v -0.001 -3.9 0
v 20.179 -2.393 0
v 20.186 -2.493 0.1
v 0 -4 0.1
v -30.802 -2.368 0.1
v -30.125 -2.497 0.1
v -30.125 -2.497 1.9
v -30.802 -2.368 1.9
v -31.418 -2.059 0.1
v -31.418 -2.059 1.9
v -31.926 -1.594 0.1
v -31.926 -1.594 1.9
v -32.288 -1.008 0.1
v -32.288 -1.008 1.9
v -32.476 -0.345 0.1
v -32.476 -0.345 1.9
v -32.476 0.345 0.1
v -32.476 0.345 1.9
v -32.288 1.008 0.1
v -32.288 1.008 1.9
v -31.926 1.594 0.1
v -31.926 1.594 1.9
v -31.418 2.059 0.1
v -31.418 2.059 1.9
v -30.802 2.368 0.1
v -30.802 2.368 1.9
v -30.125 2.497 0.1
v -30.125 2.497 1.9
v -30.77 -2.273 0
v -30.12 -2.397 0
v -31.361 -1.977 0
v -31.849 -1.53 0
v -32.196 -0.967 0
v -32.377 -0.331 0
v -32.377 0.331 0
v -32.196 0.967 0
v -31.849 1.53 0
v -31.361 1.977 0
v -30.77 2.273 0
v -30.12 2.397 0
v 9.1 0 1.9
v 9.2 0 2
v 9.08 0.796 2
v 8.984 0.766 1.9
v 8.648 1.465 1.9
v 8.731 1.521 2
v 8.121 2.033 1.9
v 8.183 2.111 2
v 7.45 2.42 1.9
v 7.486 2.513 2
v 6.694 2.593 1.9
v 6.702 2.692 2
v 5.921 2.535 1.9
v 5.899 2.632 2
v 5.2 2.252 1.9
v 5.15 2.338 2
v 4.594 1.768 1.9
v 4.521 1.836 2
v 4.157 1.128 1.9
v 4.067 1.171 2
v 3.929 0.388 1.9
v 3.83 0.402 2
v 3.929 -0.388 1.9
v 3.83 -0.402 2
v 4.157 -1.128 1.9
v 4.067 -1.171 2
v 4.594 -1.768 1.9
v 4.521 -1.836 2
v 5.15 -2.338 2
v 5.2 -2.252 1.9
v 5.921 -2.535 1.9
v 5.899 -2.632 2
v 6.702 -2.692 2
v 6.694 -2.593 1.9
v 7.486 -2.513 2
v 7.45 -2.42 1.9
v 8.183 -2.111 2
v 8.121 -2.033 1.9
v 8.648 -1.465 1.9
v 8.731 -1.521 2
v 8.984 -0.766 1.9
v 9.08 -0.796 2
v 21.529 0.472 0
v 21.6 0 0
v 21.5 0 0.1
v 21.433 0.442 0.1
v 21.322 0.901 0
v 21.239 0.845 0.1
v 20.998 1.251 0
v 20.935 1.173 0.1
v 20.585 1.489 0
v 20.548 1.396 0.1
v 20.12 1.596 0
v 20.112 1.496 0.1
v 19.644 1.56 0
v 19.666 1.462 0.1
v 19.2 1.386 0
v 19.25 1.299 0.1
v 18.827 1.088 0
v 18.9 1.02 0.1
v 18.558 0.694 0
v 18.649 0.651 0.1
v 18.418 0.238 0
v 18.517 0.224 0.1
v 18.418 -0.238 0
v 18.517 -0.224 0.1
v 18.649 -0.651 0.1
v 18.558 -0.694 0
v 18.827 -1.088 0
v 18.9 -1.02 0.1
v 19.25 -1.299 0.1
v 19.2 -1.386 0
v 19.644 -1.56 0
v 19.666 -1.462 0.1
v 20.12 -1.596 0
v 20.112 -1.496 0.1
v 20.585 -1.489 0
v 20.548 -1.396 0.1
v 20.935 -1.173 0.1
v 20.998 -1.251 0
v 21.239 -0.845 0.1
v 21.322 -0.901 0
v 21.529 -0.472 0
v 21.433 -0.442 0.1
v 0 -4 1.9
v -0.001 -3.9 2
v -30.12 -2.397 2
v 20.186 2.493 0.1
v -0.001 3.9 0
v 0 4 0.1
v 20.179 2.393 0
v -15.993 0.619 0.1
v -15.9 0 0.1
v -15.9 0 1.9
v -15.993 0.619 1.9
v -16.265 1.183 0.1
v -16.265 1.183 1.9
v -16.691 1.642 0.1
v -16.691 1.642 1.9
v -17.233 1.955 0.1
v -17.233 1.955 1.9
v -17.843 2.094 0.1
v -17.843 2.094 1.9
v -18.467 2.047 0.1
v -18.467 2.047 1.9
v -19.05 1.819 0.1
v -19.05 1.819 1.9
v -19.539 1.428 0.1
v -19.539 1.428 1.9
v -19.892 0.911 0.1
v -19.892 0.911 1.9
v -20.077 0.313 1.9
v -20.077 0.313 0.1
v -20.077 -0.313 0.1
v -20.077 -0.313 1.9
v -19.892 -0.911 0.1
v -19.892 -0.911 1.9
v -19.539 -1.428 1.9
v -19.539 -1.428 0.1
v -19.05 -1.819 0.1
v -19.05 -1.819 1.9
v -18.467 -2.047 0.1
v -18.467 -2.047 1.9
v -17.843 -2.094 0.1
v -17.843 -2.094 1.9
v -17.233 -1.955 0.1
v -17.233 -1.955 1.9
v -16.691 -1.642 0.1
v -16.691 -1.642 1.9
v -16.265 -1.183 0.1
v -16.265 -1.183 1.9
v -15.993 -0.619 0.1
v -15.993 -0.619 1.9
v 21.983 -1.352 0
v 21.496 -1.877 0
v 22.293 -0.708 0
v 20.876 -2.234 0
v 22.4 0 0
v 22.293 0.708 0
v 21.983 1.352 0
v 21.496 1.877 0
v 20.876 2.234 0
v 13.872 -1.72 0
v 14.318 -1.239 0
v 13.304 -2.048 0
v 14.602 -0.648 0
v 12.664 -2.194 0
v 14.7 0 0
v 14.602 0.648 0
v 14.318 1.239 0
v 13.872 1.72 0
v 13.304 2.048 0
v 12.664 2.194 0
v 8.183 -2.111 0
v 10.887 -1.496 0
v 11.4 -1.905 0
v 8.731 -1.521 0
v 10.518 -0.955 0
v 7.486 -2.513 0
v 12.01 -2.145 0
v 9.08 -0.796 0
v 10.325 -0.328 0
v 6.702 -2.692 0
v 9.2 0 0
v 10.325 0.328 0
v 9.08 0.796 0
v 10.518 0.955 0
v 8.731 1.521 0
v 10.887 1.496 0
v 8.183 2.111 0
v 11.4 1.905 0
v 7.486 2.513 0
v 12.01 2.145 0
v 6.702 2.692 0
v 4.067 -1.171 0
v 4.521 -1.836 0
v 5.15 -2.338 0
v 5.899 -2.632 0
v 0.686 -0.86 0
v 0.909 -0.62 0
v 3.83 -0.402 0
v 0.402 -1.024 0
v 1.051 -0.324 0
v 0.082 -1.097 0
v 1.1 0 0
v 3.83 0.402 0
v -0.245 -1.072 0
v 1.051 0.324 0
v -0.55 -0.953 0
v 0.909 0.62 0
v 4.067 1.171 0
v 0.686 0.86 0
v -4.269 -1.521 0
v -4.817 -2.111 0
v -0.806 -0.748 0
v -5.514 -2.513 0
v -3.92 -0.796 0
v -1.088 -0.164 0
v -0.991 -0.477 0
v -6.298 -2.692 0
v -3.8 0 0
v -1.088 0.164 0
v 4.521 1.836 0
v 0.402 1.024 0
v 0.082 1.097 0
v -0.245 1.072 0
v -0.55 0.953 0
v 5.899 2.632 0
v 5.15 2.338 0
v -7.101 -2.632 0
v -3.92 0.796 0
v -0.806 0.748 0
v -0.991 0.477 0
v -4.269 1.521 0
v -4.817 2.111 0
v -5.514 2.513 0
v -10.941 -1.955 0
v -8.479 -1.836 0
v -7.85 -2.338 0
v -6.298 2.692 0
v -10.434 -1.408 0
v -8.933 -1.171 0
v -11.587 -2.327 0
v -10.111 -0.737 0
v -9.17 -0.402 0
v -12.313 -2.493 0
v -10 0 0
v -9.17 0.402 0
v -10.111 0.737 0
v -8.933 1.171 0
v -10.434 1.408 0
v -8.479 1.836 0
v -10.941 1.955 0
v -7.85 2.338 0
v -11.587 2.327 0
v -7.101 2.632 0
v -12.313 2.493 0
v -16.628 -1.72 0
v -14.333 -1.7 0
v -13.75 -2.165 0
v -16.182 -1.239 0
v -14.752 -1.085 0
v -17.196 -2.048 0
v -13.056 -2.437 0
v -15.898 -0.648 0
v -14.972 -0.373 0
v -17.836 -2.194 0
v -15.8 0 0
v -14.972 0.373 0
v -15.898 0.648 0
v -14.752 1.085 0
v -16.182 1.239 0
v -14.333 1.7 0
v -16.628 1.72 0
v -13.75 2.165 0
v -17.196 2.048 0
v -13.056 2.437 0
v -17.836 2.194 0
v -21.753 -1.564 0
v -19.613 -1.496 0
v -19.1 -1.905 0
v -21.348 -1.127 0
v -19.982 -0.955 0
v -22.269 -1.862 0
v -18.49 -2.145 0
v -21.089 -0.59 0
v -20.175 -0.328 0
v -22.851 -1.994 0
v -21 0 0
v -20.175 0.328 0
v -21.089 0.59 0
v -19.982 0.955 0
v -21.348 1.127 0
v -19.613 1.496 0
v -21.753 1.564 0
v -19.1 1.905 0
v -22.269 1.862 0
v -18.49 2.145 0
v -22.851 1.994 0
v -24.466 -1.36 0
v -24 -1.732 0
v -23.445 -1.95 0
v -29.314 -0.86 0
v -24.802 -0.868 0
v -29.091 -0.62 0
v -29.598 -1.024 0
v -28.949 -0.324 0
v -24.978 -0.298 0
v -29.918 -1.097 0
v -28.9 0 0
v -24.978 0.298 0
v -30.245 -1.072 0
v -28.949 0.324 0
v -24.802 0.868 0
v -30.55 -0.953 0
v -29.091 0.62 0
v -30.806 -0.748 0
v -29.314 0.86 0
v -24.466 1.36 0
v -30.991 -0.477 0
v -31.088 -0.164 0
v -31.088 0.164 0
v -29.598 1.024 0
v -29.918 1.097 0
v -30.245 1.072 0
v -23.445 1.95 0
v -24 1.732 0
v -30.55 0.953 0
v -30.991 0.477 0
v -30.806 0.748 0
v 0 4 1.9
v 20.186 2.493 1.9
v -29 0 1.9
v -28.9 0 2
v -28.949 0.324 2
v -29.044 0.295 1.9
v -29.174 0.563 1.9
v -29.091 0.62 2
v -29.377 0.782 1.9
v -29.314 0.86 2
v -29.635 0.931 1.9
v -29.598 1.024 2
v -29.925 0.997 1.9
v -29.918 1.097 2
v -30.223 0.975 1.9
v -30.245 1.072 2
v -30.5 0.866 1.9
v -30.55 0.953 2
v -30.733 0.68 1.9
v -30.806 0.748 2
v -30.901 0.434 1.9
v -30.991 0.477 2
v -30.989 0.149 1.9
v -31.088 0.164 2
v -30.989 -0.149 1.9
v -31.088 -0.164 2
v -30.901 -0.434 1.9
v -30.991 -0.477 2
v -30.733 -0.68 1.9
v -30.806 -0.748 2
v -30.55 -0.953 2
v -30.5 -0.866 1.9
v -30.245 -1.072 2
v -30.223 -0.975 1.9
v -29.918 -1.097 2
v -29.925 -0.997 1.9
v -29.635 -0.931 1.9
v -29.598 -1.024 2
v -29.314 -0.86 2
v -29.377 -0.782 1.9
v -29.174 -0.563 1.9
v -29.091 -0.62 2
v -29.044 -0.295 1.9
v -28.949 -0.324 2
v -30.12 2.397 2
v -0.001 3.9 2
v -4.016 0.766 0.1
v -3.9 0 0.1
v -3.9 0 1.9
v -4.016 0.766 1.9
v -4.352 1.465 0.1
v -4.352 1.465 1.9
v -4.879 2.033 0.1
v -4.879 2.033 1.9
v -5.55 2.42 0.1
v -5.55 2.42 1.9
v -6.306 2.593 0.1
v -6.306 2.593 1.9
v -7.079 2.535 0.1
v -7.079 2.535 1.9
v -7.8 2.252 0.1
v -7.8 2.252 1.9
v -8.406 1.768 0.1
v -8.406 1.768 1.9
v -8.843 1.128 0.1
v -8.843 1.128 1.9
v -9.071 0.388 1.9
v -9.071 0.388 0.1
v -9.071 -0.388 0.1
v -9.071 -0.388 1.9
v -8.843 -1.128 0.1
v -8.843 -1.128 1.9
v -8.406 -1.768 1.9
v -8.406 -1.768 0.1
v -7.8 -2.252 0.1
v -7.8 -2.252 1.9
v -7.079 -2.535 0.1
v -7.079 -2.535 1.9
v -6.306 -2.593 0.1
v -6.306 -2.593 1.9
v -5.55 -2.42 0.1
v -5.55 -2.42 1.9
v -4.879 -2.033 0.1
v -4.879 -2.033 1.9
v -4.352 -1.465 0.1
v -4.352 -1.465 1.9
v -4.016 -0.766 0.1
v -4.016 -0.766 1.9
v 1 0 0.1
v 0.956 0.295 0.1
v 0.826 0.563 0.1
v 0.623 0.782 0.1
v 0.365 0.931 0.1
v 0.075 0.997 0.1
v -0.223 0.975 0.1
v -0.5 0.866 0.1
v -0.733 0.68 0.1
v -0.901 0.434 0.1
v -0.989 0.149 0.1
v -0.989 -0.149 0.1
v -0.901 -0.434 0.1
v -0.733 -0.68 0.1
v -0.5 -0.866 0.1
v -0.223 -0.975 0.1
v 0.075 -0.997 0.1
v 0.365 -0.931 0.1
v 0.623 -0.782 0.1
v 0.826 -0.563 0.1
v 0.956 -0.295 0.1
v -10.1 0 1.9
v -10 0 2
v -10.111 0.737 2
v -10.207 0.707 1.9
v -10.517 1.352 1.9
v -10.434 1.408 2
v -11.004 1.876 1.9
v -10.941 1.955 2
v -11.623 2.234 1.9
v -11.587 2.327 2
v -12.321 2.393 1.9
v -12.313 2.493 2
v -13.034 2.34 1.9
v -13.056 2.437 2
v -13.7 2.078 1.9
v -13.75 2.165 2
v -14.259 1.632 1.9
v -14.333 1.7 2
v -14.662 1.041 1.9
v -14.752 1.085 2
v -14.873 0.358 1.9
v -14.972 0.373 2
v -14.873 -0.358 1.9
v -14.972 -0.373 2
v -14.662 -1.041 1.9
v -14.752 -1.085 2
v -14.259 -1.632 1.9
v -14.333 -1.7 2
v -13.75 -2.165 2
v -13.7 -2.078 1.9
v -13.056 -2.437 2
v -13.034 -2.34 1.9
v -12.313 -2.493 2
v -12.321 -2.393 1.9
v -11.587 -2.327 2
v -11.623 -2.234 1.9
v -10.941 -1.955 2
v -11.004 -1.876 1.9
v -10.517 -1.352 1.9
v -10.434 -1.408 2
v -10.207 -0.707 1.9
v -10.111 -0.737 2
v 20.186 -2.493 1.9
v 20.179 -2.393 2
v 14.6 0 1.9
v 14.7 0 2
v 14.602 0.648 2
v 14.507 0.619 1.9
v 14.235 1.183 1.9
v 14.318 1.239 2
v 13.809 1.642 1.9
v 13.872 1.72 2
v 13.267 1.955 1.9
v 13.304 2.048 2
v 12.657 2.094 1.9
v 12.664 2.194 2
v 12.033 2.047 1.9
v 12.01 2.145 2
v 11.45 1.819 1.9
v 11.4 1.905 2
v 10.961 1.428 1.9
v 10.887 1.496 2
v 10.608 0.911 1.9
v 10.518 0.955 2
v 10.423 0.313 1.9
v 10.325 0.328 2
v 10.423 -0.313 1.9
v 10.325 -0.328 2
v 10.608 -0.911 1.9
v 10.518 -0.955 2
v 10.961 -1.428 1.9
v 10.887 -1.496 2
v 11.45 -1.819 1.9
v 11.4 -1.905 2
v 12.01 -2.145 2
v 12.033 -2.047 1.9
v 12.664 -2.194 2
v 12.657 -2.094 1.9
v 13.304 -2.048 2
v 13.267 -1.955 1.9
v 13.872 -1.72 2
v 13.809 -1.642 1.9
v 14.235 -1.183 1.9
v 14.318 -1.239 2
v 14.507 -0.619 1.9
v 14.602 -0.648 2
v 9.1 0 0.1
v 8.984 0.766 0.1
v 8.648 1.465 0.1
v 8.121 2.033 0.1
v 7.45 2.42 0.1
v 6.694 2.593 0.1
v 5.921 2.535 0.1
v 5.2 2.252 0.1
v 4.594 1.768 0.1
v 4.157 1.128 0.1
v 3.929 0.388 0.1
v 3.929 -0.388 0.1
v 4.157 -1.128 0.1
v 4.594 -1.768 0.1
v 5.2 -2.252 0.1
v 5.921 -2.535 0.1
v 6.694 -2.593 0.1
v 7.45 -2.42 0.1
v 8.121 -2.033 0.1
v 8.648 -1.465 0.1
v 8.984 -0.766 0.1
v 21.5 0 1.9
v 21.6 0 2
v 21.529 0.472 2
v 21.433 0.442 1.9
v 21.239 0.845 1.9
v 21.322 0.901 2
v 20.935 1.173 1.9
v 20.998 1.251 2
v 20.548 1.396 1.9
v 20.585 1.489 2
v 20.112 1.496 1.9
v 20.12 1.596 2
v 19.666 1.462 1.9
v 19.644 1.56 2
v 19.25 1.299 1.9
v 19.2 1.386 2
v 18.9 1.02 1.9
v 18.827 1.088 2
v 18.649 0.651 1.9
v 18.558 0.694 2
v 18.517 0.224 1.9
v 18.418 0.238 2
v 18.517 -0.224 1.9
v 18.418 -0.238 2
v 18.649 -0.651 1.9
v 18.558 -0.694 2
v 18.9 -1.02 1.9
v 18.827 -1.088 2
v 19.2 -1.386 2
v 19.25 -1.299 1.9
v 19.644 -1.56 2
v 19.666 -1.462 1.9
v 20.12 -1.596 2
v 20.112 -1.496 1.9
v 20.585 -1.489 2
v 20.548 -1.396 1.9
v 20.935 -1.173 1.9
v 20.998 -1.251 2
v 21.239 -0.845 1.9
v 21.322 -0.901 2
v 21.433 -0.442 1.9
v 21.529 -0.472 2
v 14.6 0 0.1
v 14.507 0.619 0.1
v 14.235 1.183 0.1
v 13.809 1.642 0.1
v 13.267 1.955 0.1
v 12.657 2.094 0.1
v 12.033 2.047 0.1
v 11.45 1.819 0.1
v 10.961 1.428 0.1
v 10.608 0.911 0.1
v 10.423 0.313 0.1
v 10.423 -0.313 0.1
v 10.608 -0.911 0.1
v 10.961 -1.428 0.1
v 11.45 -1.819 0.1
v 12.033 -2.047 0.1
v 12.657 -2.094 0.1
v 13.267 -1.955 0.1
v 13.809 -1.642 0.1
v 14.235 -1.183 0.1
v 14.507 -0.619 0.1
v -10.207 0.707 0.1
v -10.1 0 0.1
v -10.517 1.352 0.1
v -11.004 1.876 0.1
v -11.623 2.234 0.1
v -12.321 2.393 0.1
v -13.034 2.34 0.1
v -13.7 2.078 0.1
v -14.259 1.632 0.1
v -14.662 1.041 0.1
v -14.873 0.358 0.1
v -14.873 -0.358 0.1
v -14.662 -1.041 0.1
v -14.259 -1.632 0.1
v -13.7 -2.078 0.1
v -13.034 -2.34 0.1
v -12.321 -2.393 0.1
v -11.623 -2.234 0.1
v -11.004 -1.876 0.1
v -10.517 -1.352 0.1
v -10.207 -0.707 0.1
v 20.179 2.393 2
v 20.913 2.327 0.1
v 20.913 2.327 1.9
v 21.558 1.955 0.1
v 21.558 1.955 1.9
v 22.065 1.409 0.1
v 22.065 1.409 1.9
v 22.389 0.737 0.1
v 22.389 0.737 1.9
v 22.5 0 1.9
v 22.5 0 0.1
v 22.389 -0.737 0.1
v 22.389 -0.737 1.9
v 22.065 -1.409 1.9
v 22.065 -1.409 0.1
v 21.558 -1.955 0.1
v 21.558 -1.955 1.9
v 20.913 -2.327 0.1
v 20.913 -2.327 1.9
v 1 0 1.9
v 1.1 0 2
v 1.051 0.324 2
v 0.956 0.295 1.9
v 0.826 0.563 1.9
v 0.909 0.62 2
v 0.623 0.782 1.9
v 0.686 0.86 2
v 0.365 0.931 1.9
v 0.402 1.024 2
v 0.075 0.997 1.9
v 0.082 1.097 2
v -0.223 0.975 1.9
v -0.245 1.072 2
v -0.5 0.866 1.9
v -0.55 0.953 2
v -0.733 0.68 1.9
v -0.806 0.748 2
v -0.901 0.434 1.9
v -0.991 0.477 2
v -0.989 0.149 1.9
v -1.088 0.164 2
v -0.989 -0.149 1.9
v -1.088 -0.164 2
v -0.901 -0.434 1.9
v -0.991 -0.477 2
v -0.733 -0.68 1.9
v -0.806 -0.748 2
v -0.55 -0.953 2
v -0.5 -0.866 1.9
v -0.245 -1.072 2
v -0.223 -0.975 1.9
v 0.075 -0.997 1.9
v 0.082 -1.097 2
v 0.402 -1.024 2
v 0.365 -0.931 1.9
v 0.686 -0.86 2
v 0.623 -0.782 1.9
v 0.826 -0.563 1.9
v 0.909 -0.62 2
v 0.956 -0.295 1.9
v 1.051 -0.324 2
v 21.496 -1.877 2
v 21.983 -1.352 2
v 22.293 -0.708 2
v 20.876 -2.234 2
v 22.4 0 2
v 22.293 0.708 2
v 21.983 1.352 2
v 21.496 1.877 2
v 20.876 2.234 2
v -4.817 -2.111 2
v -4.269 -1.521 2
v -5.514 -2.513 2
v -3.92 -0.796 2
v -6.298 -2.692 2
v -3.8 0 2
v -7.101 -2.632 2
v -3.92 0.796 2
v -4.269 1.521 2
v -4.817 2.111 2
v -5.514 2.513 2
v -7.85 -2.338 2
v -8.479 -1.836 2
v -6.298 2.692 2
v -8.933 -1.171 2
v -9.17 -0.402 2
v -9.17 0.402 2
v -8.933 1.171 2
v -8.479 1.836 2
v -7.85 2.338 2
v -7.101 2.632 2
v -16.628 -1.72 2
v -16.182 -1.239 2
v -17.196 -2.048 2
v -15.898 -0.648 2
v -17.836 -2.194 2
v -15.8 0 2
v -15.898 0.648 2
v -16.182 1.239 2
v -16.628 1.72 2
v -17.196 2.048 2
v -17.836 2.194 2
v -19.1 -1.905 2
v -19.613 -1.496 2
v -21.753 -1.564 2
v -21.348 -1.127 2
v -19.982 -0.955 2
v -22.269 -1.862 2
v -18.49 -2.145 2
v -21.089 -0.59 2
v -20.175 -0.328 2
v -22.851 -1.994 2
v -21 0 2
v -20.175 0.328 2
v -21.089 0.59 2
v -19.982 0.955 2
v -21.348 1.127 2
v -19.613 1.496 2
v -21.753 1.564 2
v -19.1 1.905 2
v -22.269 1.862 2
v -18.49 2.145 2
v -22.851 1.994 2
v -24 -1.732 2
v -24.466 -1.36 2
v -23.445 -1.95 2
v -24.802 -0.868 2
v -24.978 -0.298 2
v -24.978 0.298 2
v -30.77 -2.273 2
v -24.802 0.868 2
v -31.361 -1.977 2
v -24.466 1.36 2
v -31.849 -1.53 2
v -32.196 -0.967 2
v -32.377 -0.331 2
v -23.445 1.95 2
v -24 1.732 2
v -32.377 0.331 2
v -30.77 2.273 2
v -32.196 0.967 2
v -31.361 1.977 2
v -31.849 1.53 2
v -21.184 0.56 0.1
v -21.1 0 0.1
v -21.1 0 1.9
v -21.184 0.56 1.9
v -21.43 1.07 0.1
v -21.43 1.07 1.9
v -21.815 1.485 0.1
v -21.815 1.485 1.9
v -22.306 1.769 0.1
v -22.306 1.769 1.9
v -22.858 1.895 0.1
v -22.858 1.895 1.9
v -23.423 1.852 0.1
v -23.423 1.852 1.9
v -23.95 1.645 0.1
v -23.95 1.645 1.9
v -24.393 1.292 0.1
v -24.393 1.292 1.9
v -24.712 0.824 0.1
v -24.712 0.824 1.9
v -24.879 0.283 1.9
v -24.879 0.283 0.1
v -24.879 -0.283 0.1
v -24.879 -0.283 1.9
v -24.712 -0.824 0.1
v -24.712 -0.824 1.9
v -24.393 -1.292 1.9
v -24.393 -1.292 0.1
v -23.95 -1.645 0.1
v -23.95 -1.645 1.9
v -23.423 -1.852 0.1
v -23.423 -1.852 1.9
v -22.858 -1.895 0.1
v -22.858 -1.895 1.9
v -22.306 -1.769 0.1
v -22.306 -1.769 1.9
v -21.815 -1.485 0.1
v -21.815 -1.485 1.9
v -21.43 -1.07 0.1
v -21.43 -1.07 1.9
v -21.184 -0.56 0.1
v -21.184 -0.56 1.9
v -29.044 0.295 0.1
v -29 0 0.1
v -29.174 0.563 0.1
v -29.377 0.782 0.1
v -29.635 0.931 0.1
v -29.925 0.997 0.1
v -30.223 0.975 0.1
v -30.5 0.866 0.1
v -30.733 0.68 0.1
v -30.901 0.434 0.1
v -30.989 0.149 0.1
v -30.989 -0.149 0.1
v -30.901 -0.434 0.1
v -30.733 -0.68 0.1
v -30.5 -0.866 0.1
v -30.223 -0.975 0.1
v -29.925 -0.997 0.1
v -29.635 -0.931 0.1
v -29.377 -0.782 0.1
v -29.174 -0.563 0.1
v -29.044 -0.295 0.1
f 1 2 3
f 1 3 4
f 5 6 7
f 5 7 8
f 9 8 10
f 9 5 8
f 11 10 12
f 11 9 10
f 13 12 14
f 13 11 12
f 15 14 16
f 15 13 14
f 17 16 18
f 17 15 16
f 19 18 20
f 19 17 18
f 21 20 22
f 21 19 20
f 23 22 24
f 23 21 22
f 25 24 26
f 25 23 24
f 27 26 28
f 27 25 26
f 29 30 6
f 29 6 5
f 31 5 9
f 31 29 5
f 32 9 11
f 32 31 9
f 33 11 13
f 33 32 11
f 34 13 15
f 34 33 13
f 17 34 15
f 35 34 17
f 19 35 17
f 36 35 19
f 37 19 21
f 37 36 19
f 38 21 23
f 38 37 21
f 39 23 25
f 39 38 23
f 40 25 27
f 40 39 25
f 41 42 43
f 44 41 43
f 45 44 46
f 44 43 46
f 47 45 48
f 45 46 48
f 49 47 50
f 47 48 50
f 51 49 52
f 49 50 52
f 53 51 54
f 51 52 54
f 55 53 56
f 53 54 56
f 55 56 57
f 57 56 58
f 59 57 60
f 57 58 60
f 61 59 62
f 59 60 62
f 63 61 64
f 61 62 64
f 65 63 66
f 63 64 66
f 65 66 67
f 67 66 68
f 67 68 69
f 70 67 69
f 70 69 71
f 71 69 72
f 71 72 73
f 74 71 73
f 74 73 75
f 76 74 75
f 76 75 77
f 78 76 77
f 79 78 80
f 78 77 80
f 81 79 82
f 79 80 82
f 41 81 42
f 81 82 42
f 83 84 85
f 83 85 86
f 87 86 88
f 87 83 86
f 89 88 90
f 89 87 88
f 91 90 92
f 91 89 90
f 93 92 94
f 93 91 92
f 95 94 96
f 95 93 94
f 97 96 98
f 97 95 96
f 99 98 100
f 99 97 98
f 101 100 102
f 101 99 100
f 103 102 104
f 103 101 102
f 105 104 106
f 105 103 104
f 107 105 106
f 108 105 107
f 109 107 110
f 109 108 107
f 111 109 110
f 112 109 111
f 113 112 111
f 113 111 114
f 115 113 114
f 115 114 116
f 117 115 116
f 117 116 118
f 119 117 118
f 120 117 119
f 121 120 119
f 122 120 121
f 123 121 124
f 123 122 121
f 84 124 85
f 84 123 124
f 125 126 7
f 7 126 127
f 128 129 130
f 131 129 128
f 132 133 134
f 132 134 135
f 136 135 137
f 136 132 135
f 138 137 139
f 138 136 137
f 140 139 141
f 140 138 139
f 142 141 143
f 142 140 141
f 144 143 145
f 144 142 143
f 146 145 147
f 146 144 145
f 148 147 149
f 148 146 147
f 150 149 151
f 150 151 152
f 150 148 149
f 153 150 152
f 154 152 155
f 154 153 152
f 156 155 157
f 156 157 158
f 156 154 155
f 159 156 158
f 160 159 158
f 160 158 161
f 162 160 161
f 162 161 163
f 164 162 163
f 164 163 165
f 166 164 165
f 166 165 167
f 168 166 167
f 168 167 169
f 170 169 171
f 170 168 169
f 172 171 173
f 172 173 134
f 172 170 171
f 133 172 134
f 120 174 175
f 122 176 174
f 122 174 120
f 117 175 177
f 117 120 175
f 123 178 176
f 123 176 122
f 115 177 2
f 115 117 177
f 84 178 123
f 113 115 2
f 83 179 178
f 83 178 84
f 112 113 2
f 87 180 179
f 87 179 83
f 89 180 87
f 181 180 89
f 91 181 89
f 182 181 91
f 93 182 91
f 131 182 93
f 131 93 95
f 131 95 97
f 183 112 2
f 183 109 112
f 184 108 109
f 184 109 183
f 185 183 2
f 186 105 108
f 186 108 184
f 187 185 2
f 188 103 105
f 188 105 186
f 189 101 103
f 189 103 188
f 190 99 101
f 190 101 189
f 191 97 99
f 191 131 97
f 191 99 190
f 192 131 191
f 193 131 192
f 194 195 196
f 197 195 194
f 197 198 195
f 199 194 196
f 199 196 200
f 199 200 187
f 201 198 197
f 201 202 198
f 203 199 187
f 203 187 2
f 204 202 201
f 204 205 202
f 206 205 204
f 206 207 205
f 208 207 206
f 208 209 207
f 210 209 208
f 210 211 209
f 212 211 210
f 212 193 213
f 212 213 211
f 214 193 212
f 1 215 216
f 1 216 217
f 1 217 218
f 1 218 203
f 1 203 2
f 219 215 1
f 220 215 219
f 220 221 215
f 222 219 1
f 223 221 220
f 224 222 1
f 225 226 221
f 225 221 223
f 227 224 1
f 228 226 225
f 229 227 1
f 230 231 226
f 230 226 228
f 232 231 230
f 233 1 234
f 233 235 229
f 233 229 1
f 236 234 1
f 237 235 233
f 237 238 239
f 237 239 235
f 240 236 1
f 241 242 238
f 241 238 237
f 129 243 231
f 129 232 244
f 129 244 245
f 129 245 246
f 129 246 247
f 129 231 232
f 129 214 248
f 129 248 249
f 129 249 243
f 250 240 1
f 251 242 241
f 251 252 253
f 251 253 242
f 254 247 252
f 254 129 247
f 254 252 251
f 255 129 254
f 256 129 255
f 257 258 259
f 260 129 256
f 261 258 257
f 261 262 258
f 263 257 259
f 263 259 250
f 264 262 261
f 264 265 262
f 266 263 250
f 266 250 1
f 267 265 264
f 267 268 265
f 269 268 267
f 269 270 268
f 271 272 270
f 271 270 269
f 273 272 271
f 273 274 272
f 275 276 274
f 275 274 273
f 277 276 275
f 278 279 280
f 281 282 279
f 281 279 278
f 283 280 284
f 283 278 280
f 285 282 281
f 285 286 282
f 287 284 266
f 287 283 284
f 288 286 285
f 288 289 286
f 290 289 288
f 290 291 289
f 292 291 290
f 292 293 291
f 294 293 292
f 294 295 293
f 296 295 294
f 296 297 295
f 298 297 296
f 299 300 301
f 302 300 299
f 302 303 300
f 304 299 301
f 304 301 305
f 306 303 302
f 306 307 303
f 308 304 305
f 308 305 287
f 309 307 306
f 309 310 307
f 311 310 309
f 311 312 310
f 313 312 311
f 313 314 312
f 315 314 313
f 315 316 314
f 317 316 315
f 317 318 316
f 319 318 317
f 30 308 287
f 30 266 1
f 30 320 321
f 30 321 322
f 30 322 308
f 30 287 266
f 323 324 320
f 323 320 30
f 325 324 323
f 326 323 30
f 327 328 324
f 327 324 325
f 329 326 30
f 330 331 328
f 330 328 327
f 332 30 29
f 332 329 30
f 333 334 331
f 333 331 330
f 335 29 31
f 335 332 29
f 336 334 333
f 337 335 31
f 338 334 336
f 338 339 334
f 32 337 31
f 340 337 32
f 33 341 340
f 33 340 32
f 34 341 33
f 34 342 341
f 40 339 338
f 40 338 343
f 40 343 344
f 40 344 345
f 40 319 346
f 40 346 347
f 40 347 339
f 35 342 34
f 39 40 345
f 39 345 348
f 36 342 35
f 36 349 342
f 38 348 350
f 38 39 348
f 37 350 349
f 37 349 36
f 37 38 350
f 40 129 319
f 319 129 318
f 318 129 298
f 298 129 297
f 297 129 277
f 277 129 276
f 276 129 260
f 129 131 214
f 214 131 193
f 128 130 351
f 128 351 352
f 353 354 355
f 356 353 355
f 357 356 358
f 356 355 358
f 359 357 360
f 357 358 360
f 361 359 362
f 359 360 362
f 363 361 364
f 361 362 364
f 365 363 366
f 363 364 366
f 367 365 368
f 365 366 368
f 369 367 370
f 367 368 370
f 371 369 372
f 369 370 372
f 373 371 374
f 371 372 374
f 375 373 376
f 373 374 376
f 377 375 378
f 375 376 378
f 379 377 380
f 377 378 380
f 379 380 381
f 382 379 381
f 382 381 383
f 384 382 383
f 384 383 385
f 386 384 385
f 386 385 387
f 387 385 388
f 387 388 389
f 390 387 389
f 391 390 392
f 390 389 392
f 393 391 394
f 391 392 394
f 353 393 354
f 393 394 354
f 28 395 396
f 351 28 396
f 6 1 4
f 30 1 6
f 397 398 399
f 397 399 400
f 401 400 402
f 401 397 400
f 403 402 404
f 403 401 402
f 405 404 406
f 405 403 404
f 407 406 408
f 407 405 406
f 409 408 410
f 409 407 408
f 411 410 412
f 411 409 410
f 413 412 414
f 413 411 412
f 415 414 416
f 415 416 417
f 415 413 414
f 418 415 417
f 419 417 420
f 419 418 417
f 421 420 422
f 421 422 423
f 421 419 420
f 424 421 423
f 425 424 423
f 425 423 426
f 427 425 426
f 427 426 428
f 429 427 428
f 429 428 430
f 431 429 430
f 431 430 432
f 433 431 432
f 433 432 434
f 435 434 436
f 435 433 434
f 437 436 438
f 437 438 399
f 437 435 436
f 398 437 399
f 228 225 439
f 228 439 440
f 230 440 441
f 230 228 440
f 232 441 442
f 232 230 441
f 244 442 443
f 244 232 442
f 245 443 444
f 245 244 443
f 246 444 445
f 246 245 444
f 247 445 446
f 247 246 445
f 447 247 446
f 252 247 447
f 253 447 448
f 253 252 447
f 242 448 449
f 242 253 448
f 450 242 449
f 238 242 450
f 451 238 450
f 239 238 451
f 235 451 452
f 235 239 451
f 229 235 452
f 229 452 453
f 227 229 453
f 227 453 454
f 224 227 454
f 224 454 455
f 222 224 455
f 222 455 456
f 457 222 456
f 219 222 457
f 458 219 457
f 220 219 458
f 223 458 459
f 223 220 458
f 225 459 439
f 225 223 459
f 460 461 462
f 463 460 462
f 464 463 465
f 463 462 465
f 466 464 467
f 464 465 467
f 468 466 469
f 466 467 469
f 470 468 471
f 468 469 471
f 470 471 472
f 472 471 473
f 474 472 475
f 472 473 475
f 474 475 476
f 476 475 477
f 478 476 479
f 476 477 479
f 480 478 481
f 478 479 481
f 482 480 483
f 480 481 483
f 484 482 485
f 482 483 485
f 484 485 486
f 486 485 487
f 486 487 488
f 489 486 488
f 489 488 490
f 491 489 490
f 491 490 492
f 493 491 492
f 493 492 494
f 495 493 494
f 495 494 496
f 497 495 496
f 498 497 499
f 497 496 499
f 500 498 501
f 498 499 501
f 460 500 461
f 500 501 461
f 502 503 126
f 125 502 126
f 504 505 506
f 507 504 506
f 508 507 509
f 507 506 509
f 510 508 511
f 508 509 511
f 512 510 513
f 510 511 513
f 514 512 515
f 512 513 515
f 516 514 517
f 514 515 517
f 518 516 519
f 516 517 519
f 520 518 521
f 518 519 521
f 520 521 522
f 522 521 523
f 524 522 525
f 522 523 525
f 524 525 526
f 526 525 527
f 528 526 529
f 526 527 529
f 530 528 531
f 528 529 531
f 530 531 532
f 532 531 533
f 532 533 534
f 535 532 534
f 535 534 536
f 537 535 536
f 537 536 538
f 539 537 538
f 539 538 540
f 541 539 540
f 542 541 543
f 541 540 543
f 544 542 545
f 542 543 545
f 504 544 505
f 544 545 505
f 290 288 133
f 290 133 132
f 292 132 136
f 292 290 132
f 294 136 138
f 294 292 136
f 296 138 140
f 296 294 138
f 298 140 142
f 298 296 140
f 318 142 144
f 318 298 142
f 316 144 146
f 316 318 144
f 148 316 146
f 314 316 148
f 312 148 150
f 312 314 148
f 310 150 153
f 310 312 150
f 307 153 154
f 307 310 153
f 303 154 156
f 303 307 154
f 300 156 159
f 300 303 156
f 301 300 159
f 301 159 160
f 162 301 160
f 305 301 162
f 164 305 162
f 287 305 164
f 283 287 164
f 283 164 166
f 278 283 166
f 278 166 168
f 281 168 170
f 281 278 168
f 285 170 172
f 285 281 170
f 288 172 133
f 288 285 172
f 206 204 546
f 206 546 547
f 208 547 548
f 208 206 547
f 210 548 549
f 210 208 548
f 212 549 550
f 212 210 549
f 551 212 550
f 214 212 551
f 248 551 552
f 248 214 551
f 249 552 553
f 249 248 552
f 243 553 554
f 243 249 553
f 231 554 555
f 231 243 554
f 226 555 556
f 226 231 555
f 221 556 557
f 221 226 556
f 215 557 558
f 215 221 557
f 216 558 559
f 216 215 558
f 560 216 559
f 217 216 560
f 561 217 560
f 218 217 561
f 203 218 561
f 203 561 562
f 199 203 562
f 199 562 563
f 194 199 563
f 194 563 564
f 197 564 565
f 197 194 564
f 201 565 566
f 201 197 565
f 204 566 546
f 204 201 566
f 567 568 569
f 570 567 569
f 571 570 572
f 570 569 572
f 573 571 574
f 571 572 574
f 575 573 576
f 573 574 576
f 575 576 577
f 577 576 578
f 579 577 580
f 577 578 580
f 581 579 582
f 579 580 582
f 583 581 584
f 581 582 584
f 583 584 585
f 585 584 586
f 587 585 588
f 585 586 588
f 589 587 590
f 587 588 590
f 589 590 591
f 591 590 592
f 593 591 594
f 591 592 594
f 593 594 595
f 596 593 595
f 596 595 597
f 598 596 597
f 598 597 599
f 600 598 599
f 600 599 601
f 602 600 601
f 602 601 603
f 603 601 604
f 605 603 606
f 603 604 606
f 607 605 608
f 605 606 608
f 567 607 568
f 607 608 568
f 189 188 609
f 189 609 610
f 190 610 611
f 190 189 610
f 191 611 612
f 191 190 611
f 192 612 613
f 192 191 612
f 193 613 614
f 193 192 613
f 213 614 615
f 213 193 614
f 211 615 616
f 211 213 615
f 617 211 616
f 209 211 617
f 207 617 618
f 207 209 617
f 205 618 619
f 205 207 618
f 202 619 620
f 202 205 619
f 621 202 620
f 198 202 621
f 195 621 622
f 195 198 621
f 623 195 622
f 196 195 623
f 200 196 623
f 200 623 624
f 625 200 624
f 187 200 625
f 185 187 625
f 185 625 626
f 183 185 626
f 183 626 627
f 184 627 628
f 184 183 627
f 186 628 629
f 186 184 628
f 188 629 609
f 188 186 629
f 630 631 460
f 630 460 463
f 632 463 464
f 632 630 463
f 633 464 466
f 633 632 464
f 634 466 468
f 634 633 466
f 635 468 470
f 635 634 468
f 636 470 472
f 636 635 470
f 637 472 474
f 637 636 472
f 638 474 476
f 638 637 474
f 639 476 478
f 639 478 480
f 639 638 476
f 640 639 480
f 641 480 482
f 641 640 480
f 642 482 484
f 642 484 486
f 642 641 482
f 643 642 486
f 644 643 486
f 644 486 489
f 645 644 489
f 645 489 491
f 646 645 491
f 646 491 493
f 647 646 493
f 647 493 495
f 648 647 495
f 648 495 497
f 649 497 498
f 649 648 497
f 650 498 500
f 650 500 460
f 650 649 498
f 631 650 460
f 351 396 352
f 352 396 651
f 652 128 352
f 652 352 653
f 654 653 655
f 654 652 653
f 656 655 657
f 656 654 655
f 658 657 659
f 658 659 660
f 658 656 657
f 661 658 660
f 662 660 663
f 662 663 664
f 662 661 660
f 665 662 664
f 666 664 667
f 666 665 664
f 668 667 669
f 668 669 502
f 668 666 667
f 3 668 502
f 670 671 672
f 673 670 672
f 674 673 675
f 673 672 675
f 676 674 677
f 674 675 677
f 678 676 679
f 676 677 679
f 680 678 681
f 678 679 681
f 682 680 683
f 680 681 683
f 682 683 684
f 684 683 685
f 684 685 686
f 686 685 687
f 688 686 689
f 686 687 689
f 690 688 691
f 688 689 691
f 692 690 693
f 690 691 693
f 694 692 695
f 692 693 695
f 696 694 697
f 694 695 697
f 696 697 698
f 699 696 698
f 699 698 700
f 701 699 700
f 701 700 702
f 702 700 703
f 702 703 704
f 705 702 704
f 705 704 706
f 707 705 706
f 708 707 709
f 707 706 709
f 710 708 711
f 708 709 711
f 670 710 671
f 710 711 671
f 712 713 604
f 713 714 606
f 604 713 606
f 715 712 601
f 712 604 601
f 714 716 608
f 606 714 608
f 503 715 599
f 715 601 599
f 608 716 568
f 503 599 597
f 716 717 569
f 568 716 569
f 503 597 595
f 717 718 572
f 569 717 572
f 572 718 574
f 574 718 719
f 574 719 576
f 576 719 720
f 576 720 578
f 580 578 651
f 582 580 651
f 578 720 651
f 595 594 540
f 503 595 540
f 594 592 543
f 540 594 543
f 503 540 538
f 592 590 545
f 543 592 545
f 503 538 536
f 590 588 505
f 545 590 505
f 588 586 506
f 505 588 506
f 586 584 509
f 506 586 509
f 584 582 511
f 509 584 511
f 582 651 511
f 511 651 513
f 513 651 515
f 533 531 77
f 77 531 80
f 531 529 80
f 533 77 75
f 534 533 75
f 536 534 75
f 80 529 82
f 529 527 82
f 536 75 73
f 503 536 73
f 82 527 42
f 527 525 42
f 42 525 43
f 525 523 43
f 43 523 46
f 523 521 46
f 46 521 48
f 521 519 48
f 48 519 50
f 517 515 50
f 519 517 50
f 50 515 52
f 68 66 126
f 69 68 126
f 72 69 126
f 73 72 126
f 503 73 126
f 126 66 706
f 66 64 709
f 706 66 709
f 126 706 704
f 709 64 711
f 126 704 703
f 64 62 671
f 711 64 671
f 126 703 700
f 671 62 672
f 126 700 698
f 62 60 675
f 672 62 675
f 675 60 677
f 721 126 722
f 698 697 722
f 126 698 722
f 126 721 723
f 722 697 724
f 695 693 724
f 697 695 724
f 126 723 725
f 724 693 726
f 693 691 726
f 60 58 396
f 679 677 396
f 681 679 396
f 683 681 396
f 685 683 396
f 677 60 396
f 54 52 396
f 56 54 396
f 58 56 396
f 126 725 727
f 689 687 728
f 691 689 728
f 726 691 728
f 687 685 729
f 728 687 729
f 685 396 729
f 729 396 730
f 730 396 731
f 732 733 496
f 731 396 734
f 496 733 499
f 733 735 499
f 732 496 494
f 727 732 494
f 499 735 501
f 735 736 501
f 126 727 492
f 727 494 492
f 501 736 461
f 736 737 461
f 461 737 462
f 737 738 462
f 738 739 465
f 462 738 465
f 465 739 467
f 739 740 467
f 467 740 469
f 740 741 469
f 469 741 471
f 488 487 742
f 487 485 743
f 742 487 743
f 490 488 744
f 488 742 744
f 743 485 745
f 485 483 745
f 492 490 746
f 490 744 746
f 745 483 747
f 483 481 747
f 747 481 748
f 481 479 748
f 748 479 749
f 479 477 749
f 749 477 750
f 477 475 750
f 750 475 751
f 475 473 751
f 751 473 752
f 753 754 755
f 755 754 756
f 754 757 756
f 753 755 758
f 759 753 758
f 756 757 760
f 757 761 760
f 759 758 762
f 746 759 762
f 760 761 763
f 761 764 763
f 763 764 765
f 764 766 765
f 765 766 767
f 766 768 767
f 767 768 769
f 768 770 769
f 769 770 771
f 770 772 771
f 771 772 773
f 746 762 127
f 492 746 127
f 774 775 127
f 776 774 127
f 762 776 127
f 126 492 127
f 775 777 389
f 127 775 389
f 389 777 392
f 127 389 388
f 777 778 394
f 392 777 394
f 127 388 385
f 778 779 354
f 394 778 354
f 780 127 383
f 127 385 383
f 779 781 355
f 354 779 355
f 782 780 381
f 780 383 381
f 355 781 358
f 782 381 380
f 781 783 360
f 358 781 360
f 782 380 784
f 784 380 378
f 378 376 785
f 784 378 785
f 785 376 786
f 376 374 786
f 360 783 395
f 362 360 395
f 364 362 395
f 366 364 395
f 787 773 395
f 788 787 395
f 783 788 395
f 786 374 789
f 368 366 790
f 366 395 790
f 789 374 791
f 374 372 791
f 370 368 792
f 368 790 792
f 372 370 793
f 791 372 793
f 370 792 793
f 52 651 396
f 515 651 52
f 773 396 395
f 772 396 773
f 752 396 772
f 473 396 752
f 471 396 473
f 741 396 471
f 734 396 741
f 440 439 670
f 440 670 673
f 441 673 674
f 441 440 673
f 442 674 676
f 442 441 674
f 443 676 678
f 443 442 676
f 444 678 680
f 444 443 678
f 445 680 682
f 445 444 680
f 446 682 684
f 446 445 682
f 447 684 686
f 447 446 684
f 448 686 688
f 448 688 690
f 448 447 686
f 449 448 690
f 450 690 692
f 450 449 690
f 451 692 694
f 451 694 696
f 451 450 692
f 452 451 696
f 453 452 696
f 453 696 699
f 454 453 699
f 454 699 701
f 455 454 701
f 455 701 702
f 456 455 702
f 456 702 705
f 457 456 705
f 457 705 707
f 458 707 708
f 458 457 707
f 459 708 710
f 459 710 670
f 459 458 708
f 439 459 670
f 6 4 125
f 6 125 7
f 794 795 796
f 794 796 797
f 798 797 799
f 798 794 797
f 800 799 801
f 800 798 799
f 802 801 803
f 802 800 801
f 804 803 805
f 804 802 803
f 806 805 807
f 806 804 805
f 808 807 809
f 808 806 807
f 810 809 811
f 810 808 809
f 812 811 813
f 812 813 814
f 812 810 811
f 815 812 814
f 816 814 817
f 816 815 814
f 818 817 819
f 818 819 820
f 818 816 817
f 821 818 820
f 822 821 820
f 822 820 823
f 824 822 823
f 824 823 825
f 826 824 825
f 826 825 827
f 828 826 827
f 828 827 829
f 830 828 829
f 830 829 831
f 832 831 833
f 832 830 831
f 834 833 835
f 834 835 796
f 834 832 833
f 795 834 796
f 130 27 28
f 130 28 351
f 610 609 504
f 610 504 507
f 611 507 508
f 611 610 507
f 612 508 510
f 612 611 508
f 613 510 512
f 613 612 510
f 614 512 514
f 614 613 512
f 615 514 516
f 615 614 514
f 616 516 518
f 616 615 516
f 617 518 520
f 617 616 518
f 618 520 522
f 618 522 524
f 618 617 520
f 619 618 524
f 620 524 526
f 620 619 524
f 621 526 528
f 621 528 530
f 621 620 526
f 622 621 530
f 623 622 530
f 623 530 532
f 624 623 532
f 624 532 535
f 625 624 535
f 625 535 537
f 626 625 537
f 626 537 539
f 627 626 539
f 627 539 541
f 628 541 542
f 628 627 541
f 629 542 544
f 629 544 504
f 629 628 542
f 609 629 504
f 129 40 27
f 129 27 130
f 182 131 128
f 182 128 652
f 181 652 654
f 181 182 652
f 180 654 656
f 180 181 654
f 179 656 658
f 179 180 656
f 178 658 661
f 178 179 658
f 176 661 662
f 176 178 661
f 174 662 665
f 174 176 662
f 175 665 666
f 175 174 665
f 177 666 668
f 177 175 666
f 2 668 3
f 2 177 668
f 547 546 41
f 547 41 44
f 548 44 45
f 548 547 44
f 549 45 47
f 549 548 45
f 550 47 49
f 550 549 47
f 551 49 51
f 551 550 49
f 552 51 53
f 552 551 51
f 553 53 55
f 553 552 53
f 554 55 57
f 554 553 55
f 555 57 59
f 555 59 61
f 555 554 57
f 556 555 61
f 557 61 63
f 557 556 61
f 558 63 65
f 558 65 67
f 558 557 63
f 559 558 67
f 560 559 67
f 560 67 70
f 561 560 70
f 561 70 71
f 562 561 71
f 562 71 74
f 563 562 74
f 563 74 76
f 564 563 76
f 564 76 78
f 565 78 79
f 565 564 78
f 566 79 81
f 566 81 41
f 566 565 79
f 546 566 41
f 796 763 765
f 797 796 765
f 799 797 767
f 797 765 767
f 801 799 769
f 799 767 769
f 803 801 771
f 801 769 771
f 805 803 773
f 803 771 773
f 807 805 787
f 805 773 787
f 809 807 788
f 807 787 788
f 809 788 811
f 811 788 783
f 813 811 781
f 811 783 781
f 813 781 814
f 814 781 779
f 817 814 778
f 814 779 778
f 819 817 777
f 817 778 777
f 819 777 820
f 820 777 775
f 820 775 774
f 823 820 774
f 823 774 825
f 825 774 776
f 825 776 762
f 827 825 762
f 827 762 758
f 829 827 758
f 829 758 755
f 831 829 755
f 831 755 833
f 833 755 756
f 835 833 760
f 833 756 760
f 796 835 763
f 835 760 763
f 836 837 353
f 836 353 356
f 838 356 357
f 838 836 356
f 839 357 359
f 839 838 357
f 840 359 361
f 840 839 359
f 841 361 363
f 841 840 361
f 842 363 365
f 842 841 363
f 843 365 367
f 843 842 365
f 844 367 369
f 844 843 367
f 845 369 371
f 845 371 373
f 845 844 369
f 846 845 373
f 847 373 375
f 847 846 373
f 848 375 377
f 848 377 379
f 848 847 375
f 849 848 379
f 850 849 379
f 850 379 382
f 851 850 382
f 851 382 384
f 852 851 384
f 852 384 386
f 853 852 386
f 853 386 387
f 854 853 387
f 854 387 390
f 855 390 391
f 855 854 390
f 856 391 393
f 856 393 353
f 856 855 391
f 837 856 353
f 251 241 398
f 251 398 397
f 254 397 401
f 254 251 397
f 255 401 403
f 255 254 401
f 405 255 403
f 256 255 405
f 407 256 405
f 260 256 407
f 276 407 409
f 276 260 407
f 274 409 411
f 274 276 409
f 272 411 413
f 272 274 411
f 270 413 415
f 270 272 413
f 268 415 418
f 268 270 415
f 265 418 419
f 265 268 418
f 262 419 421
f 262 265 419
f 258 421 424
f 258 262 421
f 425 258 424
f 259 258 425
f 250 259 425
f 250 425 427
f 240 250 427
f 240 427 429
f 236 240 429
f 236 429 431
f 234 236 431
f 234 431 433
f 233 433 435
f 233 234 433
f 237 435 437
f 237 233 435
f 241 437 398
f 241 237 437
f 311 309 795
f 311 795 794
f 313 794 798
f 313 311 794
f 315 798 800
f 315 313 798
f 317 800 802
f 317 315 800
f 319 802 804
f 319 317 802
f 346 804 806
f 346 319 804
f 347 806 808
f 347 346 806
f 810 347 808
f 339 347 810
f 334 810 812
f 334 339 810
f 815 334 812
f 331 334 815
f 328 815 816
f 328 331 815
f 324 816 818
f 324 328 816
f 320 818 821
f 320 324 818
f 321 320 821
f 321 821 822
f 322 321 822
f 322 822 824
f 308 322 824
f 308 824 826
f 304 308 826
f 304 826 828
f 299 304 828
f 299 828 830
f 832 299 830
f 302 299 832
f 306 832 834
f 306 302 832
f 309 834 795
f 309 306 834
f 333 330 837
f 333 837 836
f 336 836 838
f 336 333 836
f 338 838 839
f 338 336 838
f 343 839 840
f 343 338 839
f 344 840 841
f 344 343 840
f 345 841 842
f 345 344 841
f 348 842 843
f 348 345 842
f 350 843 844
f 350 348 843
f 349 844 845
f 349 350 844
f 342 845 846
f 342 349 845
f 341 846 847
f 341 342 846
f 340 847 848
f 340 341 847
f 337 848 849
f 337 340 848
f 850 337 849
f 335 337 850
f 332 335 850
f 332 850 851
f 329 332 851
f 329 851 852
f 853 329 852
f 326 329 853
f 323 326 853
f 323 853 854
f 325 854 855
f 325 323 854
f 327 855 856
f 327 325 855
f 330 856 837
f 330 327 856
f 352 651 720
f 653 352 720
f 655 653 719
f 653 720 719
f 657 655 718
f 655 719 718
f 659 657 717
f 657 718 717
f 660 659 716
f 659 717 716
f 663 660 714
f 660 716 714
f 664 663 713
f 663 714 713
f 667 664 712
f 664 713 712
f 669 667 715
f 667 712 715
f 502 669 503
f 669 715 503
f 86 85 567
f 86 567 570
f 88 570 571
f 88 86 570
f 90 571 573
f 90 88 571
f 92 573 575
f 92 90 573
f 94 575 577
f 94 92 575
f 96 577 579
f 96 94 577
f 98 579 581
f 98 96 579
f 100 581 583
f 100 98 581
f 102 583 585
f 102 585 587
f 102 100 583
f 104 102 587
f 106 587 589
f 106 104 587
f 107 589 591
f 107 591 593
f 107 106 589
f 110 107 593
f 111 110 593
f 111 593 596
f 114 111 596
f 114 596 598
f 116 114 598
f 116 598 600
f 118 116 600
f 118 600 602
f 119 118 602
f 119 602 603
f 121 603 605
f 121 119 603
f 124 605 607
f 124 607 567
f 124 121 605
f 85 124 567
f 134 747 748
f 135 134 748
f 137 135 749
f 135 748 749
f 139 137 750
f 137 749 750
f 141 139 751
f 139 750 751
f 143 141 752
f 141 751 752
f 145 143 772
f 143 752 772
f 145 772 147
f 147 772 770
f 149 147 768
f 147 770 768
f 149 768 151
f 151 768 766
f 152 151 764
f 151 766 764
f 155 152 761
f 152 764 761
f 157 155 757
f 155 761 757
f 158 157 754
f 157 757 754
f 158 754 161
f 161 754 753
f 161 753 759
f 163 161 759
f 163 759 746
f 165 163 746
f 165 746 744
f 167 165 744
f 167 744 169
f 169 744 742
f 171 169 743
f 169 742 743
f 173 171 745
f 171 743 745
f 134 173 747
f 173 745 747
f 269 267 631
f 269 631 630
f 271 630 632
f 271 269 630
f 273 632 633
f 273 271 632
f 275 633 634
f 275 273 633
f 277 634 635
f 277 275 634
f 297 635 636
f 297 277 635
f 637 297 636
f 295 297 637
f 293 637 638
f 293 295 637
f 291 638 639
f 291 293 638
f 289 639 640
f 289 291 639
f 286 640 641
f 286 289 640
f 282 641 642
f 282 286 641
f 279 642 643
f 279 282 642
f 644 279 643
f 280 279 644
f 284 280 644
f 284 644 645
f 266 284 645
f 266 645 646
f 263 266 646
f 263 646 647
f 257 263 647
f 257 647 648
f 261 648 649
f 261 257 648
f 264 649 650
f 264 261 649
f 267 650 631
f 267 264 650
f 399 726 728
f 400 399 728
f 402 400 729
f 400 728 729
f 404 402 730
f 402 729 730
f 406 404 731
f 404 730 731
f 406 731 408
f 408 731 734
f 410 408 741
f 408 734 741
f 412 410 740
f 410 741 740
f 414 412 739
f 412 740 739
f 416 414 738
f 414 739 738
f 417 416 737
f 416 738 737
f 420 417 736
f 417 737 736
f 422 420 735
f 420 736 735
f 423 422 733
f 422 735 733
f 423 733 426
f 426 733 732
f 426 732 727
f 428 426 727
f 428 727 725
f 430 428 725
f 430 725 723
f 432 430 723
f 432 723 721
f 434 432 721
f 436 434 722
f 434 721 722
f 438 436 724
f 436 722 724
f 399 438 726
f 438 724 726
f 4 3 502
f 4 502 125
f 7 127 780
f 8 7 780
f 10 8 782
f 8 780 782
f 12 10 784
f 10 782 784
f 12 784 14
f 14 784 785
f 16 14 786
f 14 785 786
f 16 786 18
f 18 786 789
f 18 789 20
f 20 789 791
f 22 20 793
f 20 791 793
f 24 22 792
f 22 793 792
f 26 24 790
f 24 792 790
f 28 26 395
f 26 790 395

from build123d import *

# Parameters (mm, degrees)
SKETCH1_R           = 1
SKETCH1_R_2         = 1.9
SKETCH1_R_3         = 2.1
SKETCH1_R_4         = 2.4
SKETCH1_R_5         = 1.5
SKETCH1_R_6         = 2.6
BOSS_EXTRUDE1_DEPTH = 2
CHAMFER1_SIZE       = 0.1


with BuildPart() as part:
    # Sketch1 → Boss-Extrude1 (new body)
    with BuildSketch(Plane.XY):
        with BuildLine():
            Line((-30.124585833, 2.496893744), (0, 4))
            Line((0, 4), (20.18611256, 2.493062798))
            ThreePointArc((20.18611256, 2.493062798), (22.5, 0), (20.18611256, -2.493062798))
            Line((20.18611256, -2.493062798), (0, -4))
            Line((0, -4), (-30.124585833, -2.496893744))
            ThreePointArc((-30.124585833, -2.496893744), (-32.5, 0), (-30.124585833, 2.496893744))
        make_face()
        with Locations((-30, 0)):
            Circle(SKETCH1_R, mode=Mode.SUBTRACT)
        with Locations((-23, 0)):
            Circle(SKETCH1_R_2, mode=Mode.SUBTRACT)
        with Locations((-18, 0)):
            Circle(SKETCH1_R_3, mode=Mode.SUBTRACT)
        with Locations((-12.5, 0)):
            Circle(SKETCH1_R_4, mode=Mode.SUBTRACT)
        Circle(SKETCH1_R, mode=Mode.SUBTRACT)
        with Locations((20, 0)):
            Circle(SKETCH1_R_5, mode=Mode.SUBTRACT)
        with Locations((-6.5, 0)):
            Circle(SKETCH1_R_6, mode=Mode.SUBTRACT)
        with Locations((6.5, 0)):
            Circle(SKETCH1_R_6, mode=Mode.SUBTRACT)
        with Locations((12.5, 0)):
            Circle(SKETCH1_R_3, mode=Mode.SUBTRACT)
    extrude(amount=BOSS_EXTRUDE1_DEPTH)

    # Chamfer1
    chamfer1_edges = [part.edges().sort_by_distance(p)[0] for p in [
        (10.09305628, -3.246531399, 2),
        (22.5, 0, 2),
        (-31, 0, 0),
        (-31, 0, 2),
        (-24.9, 0, 0),
        (10.09305628, 3.246531399, 2),
        (-24.9, 0, 2),
        (-20.1, 0, 0),
        (-15.062292916, 3.248446872, 2),
        (-20.1, 0, 2),
        (-14.9, 0, 0),
        (-14.9, 0, 2),
        (-1, 0, 0),
        (-1, 0, 2),
        (18.5, 0, 0),
        (18.5, 0, 2),
        (-9.1, 0, 0),
        (-9.1, 0, 2),
        (10.4, 0, 0),
        (10.4, 0, 2),
        (3.9, 0, 0),
        (3.9, 0, 2),
        (-32.5, 0, 2),
        (-15.062292916, 3.248446872, 0),
        (10.09305628, 3.246531399, 0),
        (22.5, 0, 0),
        (10.09305628, -3.246531399, 0),
        (-15.062292916, -3.248446872, 0),
        (-32.5, 0, 0),
        (-15.062292916, -3.248446872, 2),
    ]]
    chamfer(chamfer1_edges, length=CHAMFER1_SIZE)


solid = part.part
